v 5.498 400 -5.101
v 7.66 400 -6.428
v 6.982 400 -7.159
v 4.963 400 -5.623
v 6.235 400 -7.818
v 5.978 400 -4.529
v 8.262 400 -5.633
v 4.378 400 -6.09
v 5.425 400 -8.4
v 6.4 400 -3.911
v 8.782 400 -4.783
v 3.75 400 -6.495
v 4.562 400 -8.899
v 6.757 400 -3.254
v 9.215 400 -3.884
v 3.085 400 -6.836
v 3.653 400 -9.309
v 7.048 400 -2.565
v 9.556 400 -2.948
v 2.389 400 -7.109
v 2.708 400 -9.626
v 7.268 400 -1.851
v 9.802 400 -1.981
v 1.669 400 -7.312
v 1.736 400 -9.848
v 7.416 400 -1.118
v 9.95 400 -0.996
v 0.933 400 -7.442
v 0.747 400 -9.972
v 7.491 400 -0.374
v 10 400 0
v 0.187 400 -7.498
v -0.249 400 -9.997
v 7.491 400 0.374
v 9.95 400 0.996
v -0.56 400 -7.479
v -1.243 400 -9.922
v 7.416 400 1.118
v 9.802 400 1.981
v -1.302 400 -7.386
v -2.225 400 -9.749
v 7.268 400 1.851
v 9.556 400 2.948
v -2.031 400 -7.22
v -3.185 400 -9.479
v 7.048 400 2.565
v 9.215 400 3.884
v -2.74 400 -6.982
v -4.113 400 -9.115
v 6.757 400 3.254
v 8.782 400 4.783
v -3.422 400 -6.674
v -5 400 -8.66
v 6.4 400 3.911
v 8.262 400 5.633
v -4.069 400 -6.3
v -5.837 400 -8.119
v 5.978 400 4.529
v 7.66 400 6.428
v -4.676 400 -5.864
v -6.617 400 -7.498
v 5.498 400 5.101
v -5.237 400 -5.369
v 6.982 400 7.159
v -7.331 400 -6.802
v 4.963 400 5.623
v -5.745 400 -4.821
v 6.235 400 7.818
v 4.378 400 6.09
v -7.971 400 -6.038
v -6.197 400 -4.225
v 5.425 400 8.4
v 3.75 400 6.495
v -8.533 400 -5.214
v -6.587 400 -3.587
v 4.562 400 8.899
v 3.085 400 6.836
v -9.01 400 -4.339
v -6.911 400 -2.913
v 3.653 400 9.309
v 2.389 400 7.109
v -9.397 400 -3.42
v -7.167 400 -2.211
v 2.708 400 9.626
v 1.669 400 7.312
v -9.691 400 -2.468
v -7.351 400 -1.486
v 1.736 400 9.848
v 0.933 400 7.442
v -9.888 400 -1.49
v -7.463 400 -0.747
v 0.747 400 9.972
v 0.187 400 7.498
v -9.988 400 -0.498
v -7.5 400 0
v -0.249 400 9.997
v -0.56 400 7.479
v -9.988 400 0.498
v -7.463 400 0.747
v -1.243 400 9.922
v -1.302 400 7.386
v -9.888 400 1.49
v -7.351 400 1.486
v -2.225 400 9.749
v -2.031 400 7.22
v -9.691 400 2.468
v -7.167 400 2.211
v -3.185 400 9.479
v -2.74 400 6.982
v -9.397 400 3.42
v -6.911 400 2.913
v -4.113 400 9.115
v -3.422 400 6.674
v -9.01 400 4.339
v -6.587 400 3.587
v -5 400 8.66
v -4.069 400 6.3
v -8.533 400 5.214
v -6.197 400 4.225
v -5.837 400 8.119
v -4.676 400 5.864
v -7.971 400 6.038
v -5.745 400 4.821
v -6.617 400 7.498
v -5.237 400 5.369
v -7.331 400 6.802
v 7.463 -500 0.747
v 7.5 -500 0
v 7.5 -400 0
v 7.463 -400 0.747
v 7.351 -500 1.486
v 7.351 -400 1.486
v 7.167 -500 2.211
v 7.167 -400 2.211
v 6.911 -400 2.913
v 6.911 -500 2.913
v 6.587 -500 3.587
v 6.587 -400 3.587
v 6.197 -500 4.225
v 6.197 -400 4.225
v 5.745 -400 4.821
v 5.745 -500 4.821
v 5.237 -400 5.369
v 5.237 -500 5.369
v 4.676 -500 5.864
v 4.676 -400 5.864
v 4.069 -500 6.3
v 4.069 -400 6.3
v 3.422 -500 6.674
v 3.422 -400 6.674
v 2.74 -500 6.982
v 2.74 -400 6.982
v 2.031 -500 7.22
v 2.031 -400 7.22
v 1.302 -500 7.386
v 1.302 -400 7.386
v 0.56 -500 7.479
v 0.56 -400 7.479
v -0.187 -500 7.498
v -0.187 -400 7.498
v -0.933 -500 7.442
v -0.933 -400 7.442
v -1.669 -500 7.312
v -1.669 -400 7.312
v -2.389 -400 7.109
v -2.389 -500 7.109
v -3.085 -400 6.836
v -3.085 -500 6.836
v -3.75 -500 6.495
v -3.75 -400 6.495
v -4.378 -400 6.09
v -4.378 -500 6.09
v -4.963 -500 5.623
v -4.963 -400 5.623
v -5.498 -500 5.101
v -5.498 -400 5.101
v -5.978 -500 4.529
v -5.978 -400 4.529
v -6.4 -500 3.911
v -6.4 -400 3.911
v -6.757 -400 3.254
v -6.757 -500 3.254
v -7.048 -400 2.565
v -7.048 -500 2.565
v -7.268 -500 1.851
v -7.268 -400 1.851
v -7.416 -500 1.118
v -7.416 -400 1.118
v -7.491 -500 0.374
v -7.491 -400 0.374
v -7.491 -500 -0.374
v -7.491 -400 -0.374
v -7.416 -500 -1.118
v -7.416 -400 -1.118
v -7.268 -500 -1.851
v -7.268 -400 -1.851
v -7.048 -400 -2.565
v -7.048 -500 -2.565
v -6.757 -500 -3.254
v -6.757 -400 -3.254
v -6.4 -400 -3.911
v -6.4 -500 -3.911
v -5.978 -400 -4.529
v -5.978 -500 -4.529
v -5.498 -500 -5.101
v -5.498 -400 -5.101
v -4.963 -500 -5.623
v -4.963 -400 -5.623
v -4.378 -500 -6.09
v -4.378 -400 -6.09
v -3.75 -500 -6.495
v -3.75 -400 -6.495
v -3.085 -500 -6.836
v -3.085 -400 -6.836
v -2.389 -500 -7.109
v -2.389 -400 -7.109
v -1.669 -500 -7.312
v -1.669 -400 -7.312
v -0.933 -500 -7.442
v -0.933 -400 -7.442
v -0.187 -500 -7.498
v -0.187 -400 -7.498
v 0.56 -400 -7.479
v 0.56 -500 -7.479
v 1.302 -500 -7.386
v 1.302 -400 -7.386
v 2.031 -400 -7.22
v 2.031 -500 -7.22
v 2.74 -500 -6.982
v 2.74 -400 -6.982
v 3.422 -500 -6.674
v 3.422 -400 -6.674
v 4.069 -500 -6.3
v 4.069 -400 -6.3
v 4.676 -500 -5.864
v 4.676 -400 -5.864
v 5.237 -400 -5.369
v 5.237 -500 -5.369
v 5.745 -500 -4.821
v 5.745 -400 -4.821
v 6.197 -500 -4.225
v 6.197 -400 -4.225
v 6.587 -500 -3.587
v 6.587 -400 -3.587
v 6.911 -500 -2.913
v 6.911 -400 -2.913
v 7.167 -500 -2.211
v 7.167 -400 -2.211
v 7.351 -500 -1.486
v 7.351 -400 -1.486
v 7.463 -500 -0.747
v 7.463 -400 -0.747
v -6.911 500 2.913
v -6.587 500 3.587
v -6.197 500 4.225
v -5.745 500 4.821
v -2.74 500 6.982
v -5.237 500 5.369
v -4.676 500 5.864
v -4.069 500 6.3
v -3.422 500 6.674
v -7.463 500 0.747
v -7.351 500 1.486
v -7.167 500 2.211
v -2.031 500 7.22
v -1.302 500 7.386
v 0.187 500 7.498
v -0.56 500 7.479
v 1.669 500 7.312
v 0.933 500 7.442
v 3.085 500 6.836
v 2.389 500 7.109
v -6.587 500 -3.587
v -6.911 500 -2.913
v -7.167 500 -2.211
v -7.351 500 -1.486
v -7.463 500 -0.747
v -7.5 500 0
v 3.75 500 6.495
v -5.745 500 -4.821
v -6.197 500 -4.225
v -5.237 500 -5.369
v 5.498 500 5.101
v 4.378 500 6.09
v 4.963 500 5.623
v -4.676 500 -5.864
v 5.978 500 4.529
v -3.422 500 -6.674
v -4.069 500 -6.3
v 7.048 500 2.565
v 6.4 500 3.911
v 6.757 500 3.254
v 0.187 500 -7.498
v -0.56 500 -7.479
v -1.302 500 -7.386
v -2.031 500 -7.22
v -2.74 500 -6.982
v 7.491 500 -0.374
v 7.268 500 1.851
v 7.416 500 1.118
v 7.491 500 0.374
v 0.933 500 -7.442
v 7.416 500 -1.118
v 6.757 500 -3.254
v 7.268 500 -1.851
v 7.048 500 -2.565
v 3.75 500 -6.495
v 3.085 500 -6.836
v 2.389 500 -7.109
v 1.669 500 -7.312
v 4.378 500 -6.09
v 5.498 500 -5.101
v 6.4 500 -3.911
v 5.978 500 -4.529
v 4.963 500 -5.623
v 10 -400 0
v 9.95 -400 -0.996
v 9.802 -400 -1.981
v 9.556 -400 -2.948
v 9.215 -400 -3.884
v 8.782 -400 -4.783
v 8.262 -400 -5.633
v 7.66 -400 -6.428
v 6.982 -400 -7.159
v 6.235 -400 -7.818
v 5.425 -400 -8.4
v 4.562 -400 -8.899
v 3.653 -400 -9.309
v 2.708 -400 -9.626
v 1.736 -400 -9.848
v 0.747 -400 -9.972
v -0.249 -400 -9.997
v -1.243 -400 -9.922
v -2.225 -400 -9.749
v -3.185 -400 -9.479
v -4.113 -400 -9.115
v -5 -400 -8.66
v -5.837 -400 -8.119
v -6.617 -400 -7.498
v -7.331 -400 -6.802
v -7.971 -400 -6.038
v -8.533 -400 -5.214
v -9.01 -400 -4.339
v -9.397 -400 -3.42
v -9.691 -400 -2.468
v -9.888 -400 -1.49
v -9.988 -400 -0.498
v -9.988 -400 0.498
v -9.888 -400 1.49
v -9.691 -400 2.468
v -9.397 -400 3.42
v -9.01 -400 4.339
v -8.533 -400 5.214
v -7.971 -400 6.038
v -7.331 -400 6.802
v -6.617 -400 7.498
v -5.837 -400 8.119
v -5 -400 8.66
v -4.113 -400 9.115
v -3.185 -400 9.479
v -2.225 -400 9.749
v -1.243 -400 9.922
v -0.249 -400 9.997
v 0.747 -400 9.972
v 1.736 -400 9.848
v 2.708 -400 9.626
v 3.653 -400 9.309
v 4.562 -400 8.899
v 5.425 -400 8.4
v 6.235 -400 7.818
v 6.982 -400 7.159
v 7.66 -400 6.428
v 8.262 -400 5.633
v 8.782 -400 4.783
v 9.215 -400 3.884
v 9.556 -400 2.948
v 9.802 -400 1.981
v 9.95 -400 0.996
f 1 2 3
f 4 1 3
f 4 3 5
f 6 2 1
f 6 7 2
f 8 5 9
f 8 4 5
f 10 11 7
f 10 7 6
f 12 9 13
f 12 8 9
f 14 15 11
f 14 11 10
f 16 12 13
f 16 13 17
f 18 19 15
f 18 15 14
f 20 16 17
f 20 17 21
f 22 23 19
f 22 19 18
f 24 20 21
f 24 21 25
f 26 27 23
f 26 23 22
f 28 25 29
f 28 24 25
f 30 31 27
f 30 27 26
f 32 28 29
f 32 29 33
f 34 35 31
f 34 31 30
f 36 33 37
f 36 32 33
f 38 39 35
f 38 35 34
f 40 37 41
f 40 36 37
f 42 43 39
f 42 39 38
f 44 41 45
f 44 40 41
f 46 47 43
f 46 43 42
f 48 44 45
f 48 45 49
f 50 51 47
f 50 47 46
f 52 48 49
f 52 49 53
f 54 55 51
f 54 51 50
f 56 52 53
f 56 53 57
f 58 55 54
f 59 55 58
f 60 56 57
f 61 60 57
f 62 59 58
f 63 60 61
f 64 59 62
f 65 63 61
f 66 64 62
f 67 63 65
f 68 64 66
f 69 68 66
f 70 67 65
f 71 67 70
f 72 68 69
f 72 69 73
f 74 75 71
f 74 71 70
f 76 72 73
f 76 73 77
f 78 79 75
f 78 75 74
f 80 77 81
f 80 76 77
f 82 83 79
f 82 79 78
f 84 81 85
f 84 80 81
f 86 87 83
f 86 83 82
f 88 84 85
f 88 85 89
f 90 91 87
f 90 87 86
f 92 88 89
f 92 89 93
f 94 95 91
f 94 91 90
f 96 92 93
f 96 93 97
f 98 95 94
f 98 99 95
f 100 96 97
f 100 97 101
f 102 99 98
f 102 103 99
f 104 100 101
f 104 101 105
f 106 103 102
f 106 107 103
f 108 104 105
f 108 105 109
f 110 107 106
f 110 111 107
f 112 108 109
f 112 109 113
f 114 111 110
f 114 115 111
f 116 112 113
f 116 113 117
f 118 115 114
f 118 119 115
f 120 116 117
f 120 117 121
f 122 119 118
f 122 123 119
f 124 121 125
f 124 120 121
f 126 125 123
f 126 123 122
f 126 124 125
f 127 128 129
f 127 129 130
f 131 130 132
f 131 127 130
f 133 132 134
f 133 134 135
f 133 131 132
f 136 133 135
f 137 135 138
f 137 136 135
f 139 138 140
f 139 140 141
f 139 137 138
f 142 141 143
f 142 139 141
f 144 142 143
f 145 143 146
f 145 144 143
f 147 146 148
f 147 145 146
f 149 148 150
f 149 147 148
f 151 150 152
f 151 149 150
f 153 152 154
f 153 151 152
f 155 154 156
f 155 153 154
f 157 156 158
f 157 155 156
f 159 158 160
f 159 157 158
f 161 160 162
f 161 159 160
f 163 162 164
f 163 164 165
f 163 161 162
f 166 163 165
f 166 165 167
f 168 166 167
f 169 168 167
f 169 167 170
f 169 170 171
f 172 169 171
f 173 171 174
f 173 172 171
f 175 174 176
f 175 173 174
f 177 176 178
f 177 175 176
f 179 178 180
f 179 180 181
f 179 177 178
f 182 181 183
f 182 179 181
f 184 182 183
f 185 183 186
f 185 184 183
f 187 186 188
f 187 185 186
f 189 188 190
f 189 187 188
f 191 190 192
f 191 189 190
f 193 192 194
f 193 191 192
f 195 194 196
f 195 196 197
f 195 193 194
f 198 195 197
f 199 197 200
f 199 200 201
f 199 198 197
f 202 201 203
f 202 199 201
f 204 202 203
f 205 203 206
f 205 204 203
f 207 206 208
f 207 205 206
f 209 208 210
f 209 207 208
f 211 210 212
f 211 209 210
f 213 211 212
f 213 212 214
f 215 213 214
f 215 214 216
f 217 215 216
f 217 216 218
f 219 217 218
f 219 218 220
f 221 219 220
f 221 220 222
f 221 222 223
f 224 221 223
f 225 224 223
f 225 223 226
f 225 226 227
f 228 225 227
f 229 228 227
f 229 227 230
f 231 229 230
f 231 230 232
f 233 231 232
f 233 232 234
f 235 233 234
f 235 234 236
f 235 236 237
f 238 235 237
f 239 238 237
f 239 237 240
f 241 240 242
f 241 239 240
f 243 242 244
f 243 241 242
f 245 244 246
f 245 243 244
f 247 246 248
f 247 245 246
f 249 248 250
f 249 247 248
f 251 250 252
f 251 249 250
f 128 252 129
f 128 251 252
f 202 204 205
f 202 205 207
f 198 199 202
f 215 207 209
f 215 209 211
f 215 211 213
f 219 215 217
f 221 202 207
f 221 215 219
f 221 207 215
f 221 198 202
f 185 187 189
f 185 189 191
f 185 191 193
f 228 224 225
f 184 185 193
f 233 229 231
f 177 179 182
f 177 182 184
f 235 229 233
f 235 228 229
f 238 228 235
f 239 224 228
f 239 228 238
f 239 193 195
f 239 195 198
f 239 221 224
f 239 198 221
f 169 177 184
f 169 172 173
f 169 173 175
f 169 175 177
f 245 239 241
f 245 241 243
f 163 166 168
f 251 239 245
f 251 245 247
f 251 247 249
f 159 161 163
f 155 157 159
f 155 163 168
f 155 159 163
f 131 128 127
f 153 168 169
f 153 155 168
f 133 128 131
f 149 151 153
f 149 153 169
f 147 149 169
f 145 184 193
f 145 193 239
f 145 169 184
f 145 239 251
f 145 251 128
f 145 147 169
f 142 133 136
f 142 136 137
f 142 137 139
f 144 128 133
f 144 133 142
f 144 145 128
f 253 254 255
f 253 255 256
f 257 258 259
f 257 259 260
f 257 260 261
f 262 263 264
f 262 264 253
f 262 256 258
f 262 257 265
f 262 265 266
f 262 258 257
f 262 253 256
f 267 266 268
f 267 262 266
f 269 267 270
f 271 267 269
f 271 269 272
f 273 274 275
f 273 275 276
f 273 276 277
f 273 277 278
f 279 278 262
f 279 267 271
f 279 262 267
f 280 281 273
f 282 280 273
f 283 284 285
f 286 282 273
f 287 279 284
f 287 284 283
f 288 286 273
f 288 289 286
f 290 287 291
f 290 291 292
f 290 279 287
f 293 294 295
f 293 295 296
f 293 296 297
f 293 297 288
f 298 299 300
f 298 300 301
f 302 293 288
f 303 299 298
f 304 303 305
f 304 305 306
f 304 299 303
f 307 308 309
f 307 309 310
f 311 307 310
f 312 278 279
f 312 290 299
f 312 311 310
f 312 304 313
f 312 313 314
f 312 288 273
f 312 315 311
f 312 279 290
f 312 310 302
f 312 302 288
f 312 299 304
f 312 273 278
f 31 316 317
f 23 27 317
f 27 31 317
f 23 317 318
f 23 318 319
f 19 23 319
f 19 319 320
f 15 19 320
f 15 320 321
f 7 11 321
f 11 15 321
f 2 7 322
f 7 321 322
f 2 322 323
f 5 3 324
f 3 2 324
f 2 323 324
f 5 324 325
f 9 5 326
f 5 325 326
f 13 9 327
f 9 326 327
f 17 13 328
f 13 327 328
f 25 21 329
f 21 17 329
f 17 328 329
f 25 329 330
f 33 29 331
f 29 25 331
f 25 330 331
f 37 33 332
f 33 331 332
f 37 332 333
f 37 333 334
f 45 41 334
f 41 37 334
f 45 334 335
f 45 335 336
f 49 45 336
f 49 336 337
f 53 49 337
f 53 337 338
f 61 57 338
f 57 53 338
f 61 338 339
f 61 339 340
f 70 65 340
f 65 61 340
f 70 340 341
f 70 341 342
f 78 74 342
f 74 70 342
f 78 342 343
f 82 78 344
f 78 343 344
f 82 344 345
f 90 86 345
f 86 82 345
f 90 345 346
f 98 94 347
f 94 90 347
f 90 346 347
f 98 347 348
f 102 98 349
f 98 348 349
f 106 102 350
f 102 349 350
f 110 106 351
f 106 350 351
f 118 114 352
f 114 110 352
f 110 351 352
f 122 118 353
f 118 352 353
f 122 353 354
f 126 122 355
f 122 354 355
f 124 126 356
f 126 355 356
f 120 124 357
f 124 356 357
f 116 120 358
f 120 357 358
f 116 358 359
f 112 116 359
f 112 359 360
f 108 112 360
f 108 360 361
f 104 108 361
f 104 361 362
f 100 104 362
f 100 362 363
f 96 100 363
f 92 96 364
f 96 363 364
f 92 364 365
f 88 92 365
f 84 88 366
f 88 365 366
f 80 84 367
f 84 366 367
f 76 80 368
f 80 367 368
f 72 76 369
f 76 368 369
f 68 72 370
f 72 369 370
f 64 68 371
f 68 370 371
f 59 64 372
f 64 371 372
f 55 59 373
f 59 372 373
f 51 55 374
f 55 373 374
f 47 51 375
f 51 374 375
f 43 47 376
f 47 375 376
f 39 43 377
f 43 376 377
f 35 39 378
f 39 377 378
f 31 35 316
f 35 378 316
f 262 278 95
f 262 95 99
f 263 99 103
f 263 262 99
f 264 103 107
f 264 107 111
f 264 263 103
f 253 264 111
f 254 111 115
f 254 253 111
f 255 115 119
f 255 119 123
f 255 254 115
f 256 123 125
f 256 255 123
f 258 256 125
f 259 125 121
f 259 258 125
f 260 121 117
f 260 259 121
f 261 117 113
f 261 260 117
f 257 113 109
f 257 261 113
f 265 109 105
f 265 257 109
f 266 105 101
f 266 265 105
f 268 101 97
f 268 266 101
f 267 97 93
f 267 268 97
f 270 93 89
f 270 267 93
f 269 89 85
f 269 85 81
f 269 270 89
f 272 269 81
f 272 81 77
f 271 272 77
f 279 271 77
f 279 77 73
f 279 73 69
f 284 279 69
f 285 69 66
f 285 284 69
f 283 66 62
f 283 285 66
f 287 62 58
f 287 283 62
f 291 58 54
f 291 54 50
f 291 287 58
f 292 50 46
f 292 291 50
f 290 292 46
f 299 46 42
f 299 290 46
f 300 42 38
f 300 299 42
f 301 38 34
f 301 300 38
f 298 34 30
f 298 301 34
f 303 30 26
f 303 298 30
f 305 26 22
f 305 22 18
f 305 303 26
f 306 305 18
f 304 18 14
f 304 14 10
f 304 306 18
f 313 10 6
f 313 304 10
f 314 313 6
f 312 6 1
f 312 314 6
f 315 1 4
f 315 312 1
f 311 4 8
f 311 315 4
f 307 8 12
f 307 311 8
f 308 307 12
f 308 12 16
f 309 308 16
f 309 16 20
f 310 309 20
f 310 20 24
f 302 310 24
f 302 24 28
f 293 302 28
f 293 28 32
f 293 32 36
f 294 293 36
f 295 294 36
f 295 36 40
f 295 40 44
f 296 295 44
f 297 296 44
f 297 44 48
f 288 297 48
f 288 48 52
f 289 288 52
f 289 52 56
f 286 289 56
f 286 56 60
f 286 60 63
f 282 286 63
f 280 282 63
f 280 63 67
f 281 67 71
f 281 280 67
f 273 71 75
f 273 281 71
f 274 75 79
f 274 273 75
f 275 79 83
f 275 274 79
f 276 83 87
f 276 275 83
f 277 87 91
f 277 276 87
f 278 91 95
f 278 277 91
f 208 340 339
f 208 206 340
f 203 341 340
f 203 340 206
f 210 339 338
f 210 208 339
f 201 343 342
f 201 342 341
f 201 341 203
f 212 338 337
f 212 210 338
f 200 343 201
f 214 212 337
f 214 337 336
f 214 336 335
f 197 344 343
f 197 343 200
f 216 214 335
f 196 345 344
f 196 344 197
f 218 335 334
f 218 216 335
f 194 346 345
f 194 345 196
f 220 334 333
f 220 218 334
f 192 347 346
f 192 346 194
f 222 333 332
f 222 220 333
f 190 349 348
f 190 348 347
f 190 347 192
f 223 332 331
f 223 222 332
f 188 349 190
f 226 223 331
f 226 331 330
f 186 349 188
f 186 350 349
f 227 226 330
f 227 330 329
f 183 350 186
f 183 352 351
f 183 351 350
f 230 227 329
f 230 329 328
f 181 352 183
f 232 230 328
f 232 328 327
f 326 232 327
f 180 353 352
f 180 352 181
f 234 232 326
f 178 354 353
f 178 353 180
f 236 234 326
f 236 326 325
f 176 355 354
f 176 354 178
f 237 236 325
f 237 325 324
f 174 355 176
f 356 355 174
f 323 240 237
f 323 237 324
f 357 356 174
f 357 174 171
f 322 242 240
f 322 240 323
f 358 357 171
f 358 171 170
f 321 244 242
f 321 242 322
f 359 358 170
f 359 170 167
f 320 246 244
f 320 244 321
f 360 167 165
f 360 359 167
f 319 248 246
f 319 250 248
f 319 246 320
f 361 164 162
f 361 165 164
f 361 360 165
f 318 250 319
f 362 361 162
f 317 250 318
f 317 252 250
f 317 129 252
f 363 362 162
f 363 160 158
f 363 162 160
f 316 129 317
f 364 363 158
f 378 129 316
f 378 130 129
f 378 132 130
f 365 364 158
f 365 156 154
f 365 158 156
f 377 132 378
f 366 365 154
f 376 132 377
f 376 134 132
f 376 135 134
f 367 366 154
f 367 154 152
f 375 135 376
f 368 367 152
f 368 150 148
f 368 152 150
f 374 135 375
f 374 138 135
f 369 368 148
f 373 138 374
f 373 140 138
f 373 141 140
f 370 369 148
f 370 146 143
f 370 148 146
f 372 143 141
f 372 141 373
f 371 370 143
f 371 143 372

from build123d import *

# Parameters (mm, degrees)
F0_R      = 10
F1_DEPTH  = 500
F1_FACE_R = 10
F2_DEPTH  = 500
F3_R      = 10
F3_R_2    = 7.5
F4_DEPTH  = 100
F5_R      = 10
F5_R_2    = 7.5
F6_DEPTH  = 100


with BuildPart() as f1:
    # F0 (on Front) → F1 (new body)
    with BuildSketch(Plane.XZ):
        Circle(F0_R)
    extrude(amount=F1_DEPTH)

    # F1_face (on face) → F2 (join)
    with BuildSketch(Plane(origin=(0, 0, 0), x_dir=(1, 0, 0), z_dir=(0, 1, 0))):
        Circle(F1_FACE_R)
    extrude(amount=F2_DEPTH)

    # F3 (on face) → F4 (cut)
    with BuildSketch(Plane(origin=(0, 500, 0), x_dir=(-1, 0, 0), z_dir=(0, 1, 0))):
        Circle(F3_R)
        Circle(F3_R_2, mode=Mode.SUBTRACT)
    extrude(amount=-F4_DEPTH, mode=Mode.SUBTRACT)

    # F5 (on face) → F6 (cut)
    with BuildSketch(Plane.XZ.offset(500)):
        Circle(F5_R)
        Circle(F5_R_2, mode=Mode.SUBTRACT)
    extrude(amount=-F6_DEPTH, mode=Mode.SUBTRACT)


solid = f1.part
